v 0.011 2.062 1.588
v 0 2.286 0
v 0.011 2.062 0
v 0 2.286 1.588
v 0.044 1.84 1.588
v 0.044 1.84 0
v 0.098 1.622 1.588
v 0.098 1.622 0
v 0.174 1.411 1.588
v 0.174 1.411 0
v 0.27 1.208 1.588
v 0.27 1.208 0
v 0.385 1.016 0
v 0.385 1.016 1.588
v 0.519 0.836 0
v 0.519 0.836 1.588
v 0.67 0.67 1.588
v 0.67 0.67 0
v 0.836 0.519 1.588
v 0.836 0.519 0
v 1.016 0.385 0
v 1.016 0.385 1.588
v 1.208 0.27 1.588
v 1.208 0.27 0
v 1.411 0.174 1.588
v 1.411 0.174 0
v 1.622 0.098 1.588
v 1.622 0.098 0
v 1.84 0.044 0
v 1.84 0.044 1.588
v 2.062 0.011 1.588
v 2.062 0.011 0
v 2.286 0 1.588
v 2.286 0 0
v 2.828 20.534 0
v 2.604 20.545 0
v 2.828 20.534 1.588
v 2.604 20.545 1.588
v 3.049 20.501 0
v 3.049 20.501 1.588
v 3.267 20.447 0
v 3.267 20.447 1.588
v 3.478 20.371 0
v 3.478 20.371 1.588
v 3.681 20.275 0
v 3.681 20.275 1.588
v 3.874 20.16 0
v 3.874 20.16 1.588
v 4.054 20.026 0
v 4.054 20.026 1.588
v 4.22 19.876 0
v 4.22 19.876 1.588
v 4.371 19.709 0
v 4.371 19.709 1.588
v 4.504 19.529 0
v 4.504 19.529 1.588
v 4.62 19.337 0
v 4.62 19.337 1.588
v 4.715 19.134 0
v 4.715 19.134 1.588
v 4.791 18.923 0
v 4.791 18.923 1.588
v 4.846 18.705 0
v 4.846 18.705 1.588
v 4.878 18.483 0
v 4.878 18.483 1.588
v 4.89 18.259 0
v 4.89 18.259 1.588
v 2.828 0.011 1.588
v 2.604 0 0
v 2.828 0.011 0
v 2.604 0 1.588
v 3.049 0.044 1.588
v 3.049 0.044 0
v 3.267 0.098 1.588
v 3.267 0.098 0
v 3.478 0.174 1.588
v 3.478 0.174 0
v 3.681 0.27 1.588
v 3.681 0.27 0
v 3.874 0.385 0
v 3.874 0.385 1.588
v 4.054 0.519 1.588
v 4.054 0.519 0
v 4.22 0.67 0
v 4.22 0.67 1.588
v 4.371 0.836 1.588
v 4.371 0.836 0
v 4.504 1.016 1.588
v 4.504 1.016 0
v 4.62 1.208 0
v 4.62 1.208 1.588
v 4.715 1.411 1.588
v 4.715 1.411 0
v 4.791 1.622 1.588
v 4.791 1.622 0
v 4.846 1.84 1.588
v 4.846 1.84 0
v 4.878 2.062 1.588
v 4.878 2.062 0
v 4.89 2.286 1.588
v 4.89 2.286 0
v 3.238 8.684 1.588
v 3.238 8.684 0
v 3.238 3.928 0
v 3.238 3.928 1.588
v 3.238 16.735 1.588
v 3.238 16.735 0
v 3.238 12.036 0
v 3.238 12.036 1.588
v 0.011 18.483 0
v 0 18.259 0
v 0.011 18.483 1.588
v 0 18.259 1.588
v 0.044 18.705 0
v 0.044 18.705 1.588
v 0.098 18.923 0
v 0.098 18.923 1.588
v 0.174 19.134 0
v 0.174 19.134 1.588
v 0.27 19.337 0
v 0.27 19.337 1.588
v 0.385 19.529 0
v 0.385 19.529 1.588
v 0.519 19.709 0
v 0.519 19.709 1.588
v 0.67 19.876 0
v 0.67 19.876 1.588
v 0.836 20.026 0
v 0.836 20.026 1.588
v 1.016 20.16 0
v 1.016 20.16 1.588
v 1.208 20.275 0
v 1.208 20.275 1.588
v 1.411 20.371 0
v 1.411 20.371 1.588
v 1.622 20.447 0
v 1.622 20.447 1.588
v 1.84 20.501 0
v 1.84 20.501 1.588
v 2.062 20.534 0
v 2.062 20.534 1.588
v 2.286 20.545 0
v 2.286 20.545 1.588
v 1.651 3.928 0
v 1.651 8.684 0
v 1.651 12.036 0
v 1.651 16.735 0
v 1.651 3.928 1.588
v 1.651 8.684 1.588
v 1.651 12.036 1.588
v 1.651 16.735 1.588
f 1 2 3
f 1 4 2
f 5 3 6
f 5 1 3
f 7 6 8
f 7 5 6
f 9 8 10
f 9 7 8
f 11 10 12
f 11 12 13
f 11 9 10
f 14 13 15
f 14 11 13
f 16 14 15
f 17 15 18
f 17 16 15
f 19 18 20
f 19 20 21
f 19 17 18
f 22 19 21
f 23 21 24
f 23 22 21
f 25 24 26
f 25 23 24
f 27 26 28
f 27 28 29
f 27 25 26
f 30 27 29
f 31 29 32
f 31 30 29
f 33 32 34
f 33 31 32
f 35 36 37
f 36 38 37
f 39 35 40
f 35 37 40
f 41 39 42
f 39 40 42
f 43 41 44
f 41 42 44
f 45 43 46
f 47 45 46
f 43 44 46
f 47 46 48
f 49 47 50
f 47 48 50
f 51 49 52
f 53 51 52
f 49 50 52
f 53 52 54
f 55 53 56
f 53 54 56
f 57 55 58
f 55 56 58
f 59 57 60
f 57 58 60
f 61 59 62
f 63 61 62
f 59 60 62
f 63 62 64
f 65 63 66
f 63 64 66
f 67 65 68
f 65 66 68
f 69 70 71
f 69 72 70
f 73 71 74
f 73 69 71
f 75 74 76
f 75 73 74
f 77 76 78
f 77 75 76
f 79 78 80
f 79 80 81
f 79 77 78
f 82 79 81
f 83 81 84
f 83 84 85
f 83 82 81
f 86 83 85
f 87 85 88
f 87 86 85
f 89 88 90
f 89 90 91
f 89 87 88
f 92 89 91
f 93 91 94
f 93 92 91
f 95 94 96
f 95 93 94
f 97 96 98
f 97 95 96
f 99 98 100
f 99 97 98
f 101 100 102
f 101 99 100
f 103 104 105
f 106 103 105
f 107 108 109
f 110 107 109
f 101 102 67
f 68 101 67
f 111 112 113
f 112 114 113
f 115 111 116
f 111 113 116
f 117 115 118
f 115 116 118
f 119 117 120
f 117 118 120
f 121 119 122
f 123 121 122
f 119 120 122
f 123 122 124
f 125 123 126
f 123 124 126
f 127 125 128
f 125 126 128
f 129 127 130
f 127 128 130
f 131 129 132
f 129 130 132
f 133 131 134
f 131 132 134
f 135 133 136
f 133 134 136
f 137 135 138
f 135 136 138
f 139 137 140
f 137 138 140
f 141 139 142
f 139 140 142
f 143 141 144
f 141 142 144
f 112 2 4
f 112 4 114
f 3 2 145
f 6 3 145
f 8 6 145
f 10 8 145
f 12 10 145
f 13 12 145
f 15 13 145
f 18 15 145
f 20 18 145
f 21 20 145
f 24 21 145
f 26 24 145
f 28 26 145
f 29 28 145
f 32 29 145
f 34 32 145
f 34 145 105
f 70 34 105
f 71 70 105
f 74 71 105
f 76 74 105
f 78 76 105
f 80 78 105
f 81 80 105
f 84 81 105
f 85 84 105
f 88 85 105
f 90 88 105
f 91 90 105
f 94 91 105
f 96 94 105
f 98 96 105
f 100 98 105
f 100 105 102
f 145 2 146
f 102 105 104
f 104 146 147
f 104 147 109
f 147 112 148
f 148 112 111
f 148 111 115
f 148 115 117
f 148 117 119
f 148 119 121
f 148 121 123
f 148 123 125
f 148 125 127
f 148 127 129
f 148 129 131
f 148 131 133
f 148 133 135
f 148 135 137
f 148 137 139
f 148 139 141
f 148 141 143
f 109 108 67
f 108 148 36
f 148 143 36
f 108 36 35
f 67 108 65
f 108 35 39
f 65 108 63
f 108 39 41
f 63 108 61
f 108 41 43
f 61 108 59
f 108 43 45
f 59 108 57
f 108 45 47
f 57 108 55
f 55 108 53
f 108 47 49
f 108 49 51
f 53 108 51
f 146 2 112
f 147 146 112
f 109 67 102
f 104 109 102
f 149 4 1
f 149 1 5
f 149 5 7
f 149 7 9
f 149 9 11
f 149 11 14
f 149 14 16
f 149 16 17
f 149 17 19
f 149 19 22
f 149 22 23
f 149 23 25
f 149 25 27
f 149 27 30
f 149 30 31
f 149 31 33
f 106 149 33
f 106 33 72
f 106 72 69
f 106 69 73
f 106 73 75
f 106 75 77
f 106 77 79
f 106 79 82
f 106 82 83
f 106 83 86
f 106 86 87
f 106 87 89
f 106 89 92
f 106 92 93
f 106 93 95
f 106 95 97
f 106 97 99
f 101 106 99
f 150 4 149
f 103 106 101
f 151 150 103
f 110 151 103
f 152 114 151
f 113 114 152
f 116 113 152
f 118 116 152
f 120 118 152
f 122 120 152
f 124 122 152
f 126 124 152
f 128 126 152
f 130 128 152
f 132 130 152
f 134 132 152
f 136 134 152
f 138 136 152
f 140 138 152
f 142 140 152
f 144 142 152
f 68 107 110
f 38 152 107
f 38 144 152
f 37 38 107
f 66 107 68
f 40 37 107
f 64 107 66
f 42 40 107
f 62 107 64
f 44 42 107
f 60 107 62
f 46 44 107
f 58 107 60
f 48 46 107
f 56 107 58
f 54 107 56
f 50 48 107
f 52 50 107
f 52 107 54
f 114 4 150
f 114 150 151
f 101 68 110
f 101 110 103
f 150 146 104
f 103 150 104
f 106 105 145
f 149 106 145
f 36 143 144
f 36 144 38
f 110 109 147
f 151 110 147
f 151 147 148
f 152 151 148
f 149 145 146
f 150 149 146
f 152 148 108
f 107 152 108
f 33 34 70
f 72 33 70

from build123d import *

# Parameters (mm, degrees)
SKETCH1_W           = 4.8895
SKETCH1_H           = 20.545176785
BOSS_EXTRUDE1_DEPTH = 1.5875
CUT_EXTRUDE1_DEPTH  = 22.178565948
FILLET1_R           = 2.286


with BuildPart() as part:
    # Sketch1 → Boss-Extrude1 (new body)
    with BuildSketch(Plane.XY):
        with Locations((2.44475, 10.272588393)):
            Rectangle(SKETCH1_W, SKETCH1_H)
    extrude(amount=BOSS_EXTRUDE1_DEPTH)

    # Sketch2 → Cut-Extrude1 (cut, through all)
    with BuildSketch(Plane(origin=(0, 0, 0), x_dir=(-1, 0, 0), z_dir=(0, 0, -1))):
        Polygon((-3.2385, 14.195176785), (-3.2385, 12.036176785), (-1.651, 12.036176785), (-1.651, 14.195176785), (-1.651, 15.351361919), (-1.651, 15.678636285), (-1.651, 16.735176785), (-3.2385, 16.735176785), (-3.2385, 15.678636285), (-3.2385, 15.351361919), align=None)
        Polygon((-1.651, 5.223280418), (-1.651, 6.407477123), (-1.651, 8.684242536), (-3.2385, 8.684242536), (-3.2385, 6.407477123), (-3.2385, 5.223280418), (-3.2385, 4.866564699), (-3.2385, 3.927789612), (-1.651, 3.927789612), (-1.651, 4.866564699), align=None)
    extrude(amount=-CUT_EXTRUDE1_DEPTH, mode=Mode.SUBTRACT)

    # Fillet1
    fillet1_edges = [part.edges().sort_by_distance(p)[0] for p in [
        (0, 20.545176785, 0.79375),
        (4.8895, 20.545176785, 0.79375),
        (4.8895, 0, 0.79375),
        (0, 0, 0.79375),
    ]]
    fillet(fillet1_edges, radius=FILLET1_R)


solid = part.part
